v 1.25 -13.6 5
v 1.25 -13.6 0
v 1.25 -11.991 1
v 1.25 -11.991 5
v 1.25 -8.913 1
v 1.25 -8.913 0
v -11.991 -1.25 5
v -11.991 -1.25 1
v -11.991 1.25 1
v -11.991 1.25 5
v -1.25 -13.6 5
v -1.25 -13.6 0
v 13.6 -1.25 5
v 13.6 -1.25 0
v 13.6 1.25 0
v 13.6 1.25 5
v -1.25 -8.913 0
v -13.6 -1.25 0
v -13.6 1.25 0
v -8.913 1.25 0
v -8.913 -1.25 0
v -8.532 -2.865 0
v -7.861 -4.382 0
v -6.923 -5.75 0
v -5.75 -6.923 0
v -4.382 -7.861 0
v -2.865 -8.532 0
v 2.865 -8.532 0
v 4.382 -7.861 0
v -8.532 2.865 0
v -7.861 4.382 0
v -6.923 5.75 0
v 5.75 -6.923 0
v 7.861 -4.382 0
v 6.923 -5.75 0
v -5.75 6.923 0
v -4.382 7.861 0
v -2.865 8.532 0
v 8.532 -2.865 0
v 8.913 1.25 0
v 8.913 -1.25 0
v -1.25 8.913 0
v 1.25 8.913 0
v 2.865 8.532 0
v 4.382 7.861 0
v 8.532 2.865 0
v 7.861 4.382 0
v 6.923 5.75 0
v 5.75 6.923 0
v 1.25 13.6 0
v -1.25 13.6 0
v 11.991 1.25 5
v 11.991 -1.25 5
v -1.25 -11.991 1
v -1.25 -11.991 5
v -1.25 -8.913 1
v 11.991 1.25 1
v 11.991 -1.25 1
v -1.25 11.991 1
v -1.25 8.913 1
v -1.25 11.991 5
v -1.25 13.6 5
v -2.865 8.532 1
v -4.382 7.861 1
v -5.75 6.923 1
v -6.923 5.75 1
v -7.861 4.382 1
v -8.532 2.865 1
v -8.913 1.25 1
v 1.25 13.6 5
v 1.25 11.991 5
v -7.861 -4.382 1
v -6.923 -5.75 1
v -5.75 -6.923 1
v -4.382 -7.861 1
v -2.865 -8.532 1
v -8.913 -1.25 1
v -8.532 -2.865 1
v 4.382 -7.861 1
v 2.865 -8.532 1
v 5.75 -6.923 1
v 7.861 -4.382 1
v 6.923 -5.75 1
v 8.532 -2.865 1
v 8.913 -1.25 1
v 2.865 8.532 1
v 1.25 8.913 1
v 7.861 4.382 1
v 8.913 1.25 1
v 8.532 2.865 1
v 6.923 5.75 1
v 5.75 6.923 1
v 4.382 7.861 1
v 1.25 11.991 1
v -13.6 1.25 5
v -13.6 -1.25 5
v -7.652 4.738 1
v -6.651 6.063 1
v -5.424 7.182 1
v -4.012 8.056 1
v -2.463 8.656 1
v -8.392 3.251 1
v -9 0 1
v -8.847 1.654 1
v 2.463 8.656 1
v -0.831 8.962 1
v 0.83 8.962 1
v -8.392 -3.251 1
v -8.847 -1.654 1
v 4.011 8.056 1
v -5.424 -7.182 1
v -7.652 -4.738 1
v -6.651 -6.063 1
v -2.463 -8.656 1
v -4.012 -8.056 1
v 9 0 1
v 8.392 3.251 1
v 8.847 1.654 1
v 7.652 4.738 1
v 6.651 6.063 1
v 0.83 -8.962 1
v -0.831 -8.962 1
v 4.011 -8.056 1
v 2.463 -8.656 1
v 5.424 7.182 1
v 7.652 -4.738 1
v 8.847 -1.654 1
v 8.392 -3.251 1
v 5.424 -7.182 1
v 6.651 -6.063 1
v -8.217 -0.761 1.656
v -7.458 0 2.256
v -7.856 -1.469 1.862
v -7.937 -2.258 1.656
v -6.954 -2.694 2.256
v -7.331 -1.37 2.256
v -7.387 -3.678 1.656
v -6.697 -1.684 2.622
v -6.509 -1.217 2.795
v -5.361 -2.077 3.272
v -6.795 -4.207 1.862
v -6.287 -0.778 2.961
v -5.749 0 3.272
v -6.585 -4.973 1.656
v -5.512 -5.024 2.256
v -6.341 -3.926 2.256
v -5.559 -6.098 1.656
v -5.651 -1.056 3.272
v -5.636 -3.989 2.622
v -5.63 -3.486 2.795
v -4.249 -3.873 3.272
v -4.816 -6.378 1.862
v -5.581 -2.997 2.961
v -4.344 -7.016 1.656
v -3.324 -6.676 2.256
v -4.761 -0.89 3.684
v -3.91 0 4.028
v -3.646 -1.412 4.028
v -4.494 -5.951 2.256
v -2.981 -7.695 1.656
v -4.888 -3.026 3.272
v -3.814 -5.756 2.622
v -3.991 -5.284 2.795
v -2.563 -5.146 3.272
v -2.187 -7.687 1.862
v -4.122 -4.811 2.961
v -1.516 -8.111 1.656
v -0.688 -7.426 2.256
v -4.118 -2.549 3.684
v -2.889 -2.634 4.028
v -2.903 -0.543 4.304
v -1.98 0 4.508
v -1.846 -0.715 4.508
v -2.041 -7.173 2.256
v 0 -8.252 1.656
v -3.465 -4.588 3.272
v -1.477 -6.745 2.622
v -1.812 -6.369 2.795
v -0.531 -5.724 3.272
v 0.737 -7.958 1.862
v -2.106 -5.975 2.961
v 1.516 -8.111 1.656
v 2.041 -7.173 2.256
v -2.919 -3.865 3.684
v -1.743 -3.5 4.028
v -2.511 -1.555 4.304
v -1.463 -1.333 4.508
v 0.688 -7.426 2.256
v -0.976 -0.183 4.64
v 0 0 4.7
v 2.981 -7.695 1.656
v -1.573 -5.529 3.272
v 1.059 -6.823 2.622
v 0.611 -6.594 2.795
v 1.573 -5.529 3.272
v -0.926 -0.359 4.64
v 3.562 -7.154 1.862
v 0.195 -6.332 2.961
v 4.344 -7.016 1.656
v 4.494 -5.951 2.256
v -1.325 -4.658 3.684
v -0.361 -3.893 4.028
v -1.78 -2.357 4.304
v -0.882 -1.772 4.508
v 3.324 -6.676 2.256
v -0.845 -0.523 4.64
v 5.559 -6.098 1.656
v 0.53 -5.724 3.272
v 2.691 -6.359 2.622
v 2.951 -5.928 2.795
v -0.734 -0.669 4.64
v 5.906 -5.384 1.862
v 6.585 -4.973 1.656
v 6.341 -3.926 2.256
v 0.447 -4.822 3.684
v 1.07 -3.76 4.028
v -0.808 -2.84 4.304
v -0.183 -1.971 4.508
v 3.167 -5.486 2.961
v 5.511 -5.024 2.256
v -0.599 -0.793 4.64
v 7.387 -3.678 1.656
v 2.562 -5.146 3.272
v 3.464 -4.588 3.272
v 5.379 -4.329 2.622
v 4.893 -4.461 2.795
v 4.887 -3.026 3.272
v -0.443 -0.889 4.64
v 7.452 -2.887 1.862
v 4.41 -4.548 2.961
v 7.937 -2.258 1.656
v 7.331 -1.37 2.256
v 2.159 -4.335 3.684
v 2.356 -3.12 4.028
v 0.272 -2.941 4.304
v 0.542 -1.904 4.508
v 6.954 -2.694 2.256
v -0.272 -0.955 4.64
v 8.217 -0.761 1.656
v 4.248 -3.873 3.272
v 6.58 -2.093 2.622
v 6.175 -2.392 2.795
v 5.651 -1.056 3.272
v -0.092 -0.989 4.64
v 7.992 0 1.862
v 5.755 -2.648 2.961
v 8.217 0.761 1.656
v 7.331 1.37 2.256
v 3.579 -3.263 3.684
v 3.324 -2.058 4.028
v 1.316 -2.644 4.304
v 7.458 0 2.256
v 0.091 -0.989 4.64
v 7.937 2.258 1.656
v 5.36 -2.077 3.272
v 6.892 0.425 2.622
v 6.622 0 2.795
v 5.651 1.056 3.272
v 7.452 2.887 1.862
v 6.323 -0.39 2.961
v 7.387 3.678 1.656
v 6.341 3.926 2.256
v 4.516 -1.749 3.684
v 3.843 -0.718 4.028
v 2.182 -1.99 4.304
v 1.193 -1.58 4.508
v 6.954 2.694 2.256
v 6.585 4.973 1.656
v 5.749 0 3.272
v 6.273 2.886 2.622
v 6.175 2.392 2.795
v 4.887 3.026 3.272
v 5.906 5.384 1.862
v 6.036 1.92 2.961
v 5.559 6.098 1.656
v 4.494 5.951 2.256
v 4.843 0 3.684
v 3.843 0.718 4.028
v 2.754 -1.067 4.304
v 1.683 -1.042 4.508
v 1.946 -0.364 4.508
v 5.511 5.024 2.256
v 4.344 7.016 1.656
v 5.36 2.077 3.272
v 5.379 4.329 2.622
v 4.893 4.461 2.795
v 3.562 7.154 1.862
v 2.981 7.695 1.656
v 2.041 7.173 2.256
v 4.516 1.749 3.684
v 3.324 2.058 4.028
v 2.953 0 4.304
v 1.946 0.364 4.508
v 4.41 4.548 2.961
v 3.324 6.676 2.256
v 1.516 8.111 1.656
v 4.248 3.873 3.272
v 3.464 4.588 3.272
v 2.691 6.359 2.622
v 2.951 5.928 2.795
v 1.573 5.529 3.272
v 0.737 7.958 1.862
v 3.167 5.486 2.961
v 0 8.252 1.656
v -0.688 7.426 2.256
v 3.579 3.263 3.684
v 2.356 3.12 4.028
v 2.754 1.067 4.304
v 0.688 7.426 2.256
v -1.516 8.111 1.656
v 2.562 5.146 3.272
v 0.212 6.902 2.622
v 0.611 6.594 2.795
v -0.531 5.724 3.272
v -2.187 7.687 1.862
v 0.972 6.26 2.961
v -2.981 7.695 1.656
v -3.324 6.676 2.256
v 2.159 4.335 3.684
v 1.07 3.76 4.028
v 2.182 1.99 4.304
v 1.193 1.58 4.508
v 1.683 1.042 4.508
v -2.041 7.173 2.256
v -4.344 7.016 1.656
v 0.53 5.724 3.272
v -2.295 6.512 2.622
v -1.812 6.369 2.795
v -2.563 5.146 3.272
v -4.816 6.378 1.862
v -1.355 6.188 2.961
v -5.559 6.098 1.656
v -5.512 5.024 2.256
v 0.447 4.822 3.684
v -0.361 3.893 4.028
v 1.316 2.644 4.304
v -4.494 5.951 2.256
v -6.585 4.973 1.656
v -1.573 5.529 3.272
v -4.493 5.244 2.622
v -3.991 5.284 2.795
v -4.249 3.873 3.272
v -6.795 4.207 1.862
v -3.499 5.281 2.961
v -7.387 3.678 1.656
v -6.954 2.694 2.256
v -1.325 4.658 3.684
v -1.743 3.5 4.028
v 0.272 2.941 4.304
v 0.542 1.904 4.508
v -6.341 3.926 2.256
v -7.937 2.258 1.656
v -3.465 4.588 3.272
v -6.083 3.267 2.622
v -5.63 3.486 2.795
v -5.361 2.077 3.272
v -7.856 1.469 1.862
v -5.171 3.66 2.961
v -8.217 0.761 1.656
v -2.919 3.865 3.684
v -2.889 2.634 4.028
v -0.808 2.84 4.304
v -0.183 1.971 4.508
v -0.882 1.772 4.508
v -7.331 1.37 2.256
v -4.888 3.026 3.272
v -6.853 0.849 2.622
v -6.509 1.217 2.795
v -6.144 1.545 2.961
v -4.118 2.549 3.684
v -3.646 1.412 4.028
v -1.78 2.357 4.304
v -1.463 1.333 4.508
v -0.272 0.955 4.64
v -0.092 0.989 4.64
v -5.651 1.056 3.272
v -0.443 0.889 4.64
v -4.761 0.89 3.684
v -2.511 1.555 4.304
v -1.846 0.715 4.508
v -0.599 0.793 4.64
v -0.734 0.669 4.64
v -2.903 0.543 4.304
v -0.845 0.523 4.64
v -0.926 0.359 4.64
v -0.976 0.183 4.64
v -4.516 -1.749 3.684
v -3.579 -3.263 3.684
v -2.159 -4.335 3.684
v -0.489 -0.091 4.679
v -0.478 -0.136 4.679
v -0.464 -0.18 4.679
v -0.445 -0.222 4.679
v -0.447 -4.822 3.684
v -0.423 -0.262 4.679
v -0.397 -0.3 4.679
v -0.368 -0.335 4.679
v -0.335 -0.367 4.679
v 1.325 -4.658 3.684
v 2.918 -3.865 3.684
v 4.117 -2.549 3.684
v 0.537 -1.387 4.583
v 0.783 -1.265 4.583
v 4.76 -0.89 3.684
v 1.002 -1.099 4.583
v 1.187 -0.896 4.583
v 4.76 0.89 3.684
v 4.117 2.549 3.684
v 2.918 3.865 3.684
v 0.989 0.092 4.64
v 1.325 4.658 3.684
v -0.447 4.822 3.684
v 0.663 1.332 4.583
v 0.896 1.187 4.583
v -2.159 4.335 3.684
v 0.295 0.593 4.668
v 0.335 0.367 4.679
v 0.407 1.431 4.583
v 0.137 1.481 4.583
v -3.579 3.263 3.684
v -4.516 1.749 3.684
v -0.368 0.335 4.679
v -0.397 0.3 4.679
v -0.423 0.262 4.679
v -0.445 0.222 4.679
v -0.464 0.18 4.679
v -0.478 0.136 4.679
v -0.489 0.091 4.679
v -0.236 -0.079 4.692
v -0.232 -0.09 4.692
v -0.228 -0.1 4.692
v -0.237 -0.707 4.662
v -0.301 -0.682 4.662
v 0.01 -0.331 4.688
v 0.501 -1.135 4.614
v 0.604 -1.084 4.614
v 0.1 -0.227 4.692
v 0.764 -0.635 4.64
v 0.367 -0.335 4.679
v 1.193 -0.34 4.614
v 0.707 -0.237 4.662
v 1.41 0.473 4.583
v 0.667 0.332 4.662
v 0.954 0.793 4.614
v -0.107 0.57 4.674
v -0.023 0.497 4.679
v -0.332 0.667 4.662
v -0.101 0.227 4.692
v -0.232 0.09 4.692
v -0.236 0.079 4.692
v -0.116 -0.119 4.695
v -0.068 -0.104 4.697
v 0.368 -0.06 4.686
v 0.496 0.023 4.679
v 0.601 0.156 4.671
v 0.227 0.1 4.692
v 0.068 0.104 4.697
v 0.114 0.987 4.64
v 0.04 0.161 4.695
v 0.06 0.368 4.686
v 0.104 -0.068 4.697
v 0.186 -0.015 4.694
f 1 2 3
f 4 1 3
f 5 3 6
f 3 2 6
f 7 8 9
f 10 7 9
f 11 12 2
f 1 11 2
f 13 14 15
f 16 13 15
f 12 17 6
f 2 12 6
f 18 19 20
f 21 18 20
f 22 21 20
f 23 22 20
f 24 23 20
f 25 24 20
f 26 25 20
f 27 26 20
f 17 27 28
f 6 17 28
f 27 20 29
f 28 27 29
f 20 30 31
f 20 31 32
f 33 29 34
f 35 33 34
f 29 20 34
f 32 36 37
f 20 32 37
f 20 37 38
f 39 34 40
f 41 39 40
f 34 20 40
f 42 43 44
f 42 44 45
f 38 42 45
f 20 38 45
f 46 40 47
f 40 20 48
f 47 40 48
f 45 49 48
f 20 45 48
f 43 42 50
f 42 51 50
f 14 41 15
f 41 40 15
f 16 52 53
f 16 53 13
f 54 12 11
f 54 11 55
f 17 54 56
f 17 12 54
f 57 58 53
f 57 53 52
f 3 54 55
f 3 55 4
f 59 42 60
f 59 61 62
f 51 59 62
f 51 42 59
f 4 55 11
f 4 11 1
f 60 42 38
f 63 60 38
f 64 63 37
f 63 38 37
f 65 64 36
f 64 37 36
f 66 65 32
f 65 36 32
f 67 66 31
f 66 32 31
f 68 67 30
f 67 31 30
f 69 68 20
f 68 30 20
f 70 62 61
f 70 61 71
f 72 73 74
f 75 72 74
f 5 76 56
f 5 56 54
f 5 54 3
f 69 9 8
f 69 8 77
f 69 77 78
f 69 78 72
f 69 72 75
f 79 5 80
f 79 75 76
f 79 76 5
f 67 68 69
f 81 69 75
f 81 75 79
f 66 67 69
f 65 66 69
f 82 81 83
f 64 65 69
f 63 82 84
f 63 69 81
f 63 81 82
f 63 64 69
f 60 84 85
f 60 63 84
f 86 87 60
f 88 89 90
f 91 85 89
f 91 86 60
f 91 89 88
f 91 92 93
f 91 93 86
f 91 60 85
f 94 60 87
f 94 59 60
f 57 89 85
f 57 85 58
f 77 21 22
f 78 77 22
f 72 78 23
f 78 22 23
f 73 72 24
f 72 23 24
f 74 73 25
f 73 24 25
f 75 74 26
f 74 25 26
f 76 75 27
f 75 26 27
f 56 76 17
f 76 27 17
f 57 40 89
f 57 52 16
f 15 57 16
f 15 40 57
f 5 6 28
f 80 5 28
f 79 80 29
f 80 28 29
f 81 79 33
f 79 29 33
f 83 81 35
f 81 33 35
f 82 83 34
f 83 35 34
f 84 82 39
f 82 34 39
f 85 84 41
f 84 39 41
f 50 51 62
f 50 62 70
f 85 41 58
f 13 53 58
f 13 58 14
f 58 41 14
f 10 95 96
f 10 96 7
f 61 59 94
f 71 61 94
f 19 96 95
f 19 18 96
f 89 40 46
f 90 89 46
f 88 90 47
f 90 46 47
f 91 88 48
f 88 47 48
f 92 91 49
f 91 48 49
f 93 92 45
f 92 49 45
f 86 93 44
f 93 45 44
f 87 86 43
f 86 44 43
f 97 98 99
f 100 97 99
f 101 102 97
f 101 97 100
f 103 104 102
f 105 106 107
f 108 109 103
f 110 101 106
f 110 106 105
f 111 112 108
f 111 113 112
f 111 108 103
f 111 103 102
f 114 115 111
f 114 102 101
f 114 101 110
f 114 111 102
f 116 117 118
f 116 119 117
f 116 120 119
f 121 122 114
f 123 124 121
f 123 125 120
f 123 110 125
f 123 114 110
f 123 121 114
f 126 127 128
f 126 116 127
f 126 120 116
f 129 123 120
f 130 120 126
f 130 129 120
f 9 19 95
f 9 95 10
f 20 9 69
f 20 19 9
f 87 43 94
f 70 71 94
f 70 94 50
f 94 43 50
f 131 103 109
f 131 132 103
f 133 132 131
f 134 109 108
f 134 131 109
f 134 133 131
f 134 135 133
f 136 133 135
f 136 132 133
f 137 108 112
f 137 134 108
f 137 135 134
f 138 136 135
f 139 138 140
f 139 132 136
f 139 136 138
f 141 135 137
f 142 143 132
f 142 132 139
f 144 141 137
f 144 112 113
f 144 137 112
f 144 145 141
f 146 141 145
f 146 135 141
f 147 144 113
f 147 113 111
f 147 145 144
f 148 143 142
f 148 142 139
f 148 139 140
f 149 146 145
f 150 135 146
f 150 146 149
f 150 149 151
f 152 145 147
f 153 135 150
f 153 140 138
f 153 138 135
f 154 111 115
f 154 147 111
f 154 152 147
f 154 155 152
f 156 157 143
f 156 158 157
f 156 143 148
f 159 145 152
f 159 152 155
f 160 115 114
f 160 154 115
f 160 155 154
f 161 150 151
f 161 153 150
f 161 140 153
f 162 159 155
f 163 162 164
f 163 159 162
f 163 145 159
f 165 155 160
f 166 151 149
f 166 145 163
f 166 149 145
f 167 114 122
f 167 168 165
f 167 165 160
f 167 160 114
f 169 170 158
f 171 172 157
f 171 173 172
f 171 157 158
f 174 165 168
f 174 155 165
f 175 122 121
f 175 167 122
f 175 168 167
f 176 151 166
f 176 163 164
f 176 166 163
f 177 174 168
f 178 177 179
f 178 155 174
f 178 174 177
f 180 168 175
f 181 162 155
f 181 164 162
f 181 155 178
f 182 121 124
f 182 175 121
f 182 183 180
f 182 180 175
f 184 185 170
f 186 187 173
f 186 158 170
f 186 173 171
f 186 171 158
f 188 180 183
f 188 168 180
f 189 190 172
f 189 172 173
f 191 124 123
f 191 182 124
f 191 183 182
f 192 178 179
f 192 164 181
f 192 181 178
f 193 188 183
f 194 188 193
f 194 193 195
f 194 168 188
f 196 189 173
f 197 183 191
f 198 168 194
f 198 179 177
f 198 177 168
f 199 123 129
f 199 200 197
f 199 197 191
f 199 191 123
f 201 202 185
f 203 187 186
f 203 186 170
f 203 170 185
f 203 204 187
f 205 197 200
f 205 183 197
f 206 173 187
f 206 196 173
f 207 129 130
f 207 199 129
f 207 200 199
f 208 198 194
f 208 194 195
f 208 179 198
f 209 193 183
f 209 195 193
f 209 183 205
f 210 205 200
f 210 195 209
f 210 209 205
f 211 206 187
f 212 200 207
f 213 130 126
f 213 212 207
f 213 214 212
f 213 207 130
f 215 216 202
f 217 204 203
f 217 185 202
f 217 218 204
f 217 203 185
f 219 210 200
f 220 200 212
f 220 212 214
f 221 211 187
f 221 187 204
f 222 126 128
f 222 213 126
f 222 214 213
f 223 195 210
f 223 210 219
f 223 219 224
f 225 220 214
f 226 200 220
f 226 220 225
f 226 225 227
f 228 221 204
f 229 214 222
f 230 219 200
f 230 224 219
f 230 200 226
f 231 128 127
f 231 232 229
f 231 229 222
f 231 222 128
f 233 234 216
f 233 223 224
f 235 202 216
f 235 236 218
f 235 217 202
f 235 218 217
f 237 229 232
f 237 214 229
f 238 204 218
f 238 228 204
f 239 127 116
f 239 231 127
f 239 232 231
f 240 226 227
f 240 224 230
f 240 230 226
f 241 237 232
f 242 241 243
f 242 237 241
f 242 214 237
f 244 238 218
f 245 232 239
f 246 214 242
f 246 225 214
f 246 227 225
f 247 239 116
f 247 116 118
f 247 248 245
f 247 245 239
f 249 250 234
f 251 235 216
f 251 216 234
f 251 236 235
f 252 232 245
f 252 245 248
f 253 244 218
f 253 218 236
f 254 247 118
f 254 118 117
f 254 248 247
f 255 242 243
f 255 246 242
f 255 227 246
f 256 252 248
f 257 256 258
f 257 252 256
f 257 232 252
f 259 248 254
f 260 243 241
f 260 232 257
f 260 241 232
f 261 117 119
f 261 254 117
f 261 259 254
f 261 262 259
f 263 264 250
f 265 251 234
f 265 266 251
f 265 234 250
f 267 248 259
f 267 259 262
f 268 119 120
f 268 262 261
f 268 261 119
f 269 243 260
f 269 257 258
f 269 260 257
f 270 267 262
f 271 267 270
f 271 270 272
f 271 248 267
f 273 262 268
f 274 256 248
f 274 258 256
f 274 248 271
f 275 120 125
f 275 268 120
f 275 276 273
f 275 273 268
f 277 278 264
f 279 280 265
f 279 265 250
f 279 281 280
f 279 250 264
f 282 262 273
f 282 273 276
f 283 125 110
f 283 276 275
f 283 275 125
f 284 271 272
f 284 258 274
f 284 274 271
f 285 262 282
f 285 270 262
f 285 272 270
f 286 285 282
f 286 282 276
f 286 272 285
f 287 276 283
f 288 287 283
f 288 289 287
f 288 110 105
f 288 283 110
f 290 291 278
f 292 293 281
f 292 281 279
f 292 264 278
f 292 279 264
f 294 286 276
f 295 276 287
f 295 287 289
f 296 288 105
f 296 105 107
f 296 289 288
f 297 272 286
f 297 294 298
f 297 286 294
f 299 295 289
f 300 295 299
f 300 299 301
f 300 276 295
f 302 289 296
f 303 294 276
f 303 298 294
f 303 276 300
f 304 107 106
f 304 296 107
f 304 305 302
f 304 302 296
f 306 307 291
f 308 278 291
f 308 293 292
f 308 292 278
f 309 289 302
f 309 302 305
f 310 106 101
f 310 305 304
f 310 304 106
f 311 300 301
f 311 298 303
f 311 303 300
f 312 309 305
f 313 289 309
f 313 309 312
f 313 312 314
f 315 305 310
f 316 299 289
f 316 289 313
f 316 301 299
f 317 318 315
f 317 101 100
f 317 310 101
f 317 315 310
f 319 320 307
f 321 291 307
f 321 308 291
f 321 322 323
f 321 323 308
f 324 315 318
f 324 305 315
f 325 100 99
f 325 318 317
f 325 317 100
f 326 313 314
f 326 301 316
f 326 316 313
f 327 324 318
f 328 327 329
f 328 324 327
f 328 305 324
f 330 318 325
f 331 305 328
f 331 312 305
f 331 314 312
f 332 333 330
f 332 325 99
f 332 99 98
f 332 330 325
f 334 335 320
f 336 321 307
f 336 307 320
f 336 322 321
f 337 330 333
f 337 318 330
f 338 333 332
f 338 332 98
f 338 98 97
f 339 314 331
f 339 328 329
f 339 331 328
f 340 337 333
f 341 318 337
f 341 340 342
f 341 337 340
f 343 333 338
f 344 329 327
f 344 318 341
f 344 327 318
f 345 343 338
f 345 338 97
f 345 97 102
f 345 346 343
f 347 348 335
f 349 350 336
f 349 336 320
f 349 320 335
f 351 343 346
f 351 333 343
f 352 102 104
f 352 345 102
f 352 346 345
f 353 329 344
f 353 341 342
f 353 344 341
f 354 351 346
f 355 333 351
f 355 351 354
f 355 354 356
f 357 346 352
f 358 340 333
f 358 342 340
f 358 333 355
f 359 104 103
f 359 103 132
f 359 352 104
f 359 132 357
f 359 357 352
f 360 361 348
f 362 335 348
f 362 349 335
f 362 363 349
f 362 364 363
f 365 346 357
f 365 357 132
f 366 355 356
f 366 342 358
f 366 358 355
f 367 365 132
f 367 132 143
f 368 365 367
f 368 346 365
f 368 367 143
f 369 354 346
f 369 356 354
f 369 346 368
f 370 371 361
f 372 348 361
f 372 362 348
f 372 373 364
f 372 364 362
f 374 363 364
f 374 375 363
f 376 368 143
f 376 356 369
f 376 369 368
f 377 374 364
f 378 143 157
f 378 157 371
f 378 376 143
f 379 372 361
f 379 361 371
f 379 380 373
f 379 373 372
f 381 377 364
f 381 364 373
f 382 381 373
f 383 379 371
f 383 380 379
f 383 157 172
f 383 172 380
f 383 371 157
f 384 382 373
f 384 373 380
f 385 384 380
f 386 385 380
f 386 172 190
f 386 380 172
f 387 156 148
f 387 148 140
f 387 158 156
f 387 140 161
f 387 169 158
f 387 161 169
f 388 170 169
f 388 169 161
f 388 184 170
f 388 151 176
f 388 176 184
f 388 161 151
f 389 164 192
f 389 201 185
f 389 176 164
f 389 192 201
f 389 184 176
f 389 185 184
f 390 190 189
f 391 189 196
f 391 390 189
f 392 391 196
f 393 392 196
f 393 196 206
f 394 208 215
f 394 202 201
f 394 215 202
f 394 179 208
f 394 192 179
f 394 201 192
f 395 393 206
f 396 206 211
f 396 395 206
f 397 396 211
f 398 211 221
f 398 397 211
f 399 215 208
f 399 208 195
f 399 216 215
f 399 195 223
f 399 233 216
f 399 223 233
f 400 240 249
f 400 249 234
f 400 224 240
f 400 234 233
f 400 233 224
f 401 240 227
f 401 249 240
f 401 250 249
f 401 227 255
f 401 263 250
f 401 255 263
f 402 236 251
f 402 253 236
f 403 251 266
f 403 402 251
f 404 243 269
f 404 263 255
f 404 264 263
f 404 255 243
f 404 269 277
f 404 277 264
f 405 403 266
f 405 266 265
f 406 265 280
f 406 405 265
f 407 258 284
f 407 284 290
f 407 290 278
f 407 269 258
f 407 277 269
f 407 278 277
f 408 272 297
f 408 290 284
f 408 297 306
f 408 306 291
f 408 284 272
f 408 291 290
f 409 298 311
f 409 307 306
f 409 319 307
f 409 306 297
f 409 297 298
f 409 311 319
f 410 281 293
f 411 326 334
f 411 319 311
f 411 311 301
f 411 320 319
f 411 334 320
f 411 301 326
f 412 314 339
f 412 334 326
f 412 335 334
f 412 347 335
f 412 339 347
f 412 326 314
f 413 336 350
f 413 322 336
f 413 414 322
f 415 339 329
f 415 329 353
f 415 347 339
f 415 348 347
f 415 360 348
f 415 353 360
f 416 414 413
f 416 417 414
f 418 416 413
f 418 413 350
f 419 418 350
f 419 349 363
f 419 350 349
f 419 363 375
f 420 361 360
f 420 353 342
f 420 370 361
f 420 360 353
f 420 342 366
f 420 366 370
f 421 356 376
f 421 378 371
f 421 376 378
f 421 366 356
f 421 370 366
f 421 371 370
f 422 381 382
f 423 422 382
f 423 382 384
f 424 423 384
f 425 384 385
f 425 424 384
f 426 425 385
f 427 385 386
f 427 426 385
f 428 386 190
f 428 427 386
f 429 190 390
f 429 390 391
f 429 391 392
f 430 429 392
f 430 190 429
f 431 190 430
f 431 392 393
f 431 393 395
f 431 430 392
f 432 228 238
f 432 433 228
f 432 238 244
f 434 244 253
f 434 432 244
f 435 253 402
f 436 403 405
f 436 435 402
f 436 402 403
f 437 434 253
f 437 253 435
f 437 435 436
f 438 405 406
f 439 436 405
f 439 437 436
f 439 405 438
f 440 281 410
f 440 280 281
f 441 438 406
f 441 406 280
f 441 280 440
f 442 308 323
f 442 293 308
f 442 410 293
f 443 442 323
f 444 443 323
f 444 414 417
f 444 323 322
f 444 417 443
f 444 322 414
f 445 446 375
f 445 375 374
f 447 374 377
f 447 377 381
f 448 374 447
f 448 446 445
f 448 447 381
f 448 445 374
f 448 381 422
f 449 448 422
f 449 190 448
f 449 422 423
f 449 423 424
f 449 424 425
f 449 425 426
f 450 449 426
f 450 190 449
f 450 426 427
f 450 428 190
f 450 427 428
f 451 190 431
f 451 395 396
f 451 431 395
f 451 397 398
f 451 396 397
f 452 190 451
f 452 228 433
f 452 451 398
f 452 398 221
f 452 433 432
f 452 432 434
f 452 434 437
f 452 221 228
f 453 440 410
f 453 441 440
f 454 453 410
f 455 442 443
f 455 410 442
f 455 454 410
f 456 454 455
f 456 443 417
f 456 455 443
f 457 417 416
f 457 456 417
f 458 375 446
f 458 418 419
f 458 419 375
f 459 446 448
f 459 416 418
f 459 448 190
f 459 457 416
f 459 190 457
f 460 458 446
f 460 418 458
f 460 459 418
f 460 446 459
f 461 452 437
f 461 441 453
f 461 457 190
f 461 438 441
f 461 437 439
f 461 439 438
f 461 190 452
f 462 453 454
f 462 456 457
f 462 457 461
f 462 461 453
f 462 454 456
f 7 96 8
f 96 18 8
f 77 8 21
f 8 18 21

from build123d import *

# Parameters (mm, degrees)
SKETCH1_R           = 9
SKETCH1_W           = 27.2
SKETCH1_H           = 2.5
SKETCH1_W_2         = 2.5
SKETCH1_H_2         = 27.2
BOSS_EXTRUDE1_DEPTH = 1
SKETCH2_W           = 1.609397648
SKETCH2_H           = 2.5
SKETCH2_W_2         = 2.5
SKETCH2_H_2         = 1.609397648
BOSS_EXTRUDE2_DEPTH = 4


with BuildPart() as part:
    # Sketch1 → Boss-Extrude1 (new body)
    with BuildSketch(Plane.XY):
        Circle(SKETCH1_R)
        Rectangle(SKETCH1_W, SKETCH1_H)
        Rectangle(SKETCH1_W_2, SKETCH1_H_2)
    extrude(amount=BOSS_EXTRUDE1_DEPTH)

    # Sketch2 → Boss-Extrude2 (add)
    with BuildSketch(Plane.XY.offset(1)):
        with Locations((-12.795301176, 0)):
            Rectangle(SKETCH2_W, SKETCH2_H)
        with Locations((0, 12.795301176)):
            Rectangle(SKETCH2_W_2, SKETCH2_H_2)
        with Locations((12.795301176, 0)):
            Rectangle(SKETCH2_W, SKETCH2_H)
        with Locations((0, -12.795301176)):
            Rectangle(SKETCH2_W_2, SKETCH2_H_2)
    extrude(amount=BOSS_EXTRUDE2_DEPTH)


with BuildPart() as body_2:
    # Sketch7 → Revolve4 (revolve)
    with BuildSketch(Plane(origin=(0, 0, 0), x_dir=(1, 0, 0), z_dir=(0, 1, 0))):
        with BuildLine():
            Line((-0.000156816, -1), (-9.000156816, -1))
            ThreePointArc((-9.000156816, -1), (-4.843081536, -3.684141213), (-0.000156816, -4.7))
            Line((-0.000156816, -4.7), (-0.000156816, -1))
        make_face()
    revolve(axis=Axis((-0.000156816, 0, 4.7), (0, 0, 1)))


solid = Compound([part.part, body_2.part])
